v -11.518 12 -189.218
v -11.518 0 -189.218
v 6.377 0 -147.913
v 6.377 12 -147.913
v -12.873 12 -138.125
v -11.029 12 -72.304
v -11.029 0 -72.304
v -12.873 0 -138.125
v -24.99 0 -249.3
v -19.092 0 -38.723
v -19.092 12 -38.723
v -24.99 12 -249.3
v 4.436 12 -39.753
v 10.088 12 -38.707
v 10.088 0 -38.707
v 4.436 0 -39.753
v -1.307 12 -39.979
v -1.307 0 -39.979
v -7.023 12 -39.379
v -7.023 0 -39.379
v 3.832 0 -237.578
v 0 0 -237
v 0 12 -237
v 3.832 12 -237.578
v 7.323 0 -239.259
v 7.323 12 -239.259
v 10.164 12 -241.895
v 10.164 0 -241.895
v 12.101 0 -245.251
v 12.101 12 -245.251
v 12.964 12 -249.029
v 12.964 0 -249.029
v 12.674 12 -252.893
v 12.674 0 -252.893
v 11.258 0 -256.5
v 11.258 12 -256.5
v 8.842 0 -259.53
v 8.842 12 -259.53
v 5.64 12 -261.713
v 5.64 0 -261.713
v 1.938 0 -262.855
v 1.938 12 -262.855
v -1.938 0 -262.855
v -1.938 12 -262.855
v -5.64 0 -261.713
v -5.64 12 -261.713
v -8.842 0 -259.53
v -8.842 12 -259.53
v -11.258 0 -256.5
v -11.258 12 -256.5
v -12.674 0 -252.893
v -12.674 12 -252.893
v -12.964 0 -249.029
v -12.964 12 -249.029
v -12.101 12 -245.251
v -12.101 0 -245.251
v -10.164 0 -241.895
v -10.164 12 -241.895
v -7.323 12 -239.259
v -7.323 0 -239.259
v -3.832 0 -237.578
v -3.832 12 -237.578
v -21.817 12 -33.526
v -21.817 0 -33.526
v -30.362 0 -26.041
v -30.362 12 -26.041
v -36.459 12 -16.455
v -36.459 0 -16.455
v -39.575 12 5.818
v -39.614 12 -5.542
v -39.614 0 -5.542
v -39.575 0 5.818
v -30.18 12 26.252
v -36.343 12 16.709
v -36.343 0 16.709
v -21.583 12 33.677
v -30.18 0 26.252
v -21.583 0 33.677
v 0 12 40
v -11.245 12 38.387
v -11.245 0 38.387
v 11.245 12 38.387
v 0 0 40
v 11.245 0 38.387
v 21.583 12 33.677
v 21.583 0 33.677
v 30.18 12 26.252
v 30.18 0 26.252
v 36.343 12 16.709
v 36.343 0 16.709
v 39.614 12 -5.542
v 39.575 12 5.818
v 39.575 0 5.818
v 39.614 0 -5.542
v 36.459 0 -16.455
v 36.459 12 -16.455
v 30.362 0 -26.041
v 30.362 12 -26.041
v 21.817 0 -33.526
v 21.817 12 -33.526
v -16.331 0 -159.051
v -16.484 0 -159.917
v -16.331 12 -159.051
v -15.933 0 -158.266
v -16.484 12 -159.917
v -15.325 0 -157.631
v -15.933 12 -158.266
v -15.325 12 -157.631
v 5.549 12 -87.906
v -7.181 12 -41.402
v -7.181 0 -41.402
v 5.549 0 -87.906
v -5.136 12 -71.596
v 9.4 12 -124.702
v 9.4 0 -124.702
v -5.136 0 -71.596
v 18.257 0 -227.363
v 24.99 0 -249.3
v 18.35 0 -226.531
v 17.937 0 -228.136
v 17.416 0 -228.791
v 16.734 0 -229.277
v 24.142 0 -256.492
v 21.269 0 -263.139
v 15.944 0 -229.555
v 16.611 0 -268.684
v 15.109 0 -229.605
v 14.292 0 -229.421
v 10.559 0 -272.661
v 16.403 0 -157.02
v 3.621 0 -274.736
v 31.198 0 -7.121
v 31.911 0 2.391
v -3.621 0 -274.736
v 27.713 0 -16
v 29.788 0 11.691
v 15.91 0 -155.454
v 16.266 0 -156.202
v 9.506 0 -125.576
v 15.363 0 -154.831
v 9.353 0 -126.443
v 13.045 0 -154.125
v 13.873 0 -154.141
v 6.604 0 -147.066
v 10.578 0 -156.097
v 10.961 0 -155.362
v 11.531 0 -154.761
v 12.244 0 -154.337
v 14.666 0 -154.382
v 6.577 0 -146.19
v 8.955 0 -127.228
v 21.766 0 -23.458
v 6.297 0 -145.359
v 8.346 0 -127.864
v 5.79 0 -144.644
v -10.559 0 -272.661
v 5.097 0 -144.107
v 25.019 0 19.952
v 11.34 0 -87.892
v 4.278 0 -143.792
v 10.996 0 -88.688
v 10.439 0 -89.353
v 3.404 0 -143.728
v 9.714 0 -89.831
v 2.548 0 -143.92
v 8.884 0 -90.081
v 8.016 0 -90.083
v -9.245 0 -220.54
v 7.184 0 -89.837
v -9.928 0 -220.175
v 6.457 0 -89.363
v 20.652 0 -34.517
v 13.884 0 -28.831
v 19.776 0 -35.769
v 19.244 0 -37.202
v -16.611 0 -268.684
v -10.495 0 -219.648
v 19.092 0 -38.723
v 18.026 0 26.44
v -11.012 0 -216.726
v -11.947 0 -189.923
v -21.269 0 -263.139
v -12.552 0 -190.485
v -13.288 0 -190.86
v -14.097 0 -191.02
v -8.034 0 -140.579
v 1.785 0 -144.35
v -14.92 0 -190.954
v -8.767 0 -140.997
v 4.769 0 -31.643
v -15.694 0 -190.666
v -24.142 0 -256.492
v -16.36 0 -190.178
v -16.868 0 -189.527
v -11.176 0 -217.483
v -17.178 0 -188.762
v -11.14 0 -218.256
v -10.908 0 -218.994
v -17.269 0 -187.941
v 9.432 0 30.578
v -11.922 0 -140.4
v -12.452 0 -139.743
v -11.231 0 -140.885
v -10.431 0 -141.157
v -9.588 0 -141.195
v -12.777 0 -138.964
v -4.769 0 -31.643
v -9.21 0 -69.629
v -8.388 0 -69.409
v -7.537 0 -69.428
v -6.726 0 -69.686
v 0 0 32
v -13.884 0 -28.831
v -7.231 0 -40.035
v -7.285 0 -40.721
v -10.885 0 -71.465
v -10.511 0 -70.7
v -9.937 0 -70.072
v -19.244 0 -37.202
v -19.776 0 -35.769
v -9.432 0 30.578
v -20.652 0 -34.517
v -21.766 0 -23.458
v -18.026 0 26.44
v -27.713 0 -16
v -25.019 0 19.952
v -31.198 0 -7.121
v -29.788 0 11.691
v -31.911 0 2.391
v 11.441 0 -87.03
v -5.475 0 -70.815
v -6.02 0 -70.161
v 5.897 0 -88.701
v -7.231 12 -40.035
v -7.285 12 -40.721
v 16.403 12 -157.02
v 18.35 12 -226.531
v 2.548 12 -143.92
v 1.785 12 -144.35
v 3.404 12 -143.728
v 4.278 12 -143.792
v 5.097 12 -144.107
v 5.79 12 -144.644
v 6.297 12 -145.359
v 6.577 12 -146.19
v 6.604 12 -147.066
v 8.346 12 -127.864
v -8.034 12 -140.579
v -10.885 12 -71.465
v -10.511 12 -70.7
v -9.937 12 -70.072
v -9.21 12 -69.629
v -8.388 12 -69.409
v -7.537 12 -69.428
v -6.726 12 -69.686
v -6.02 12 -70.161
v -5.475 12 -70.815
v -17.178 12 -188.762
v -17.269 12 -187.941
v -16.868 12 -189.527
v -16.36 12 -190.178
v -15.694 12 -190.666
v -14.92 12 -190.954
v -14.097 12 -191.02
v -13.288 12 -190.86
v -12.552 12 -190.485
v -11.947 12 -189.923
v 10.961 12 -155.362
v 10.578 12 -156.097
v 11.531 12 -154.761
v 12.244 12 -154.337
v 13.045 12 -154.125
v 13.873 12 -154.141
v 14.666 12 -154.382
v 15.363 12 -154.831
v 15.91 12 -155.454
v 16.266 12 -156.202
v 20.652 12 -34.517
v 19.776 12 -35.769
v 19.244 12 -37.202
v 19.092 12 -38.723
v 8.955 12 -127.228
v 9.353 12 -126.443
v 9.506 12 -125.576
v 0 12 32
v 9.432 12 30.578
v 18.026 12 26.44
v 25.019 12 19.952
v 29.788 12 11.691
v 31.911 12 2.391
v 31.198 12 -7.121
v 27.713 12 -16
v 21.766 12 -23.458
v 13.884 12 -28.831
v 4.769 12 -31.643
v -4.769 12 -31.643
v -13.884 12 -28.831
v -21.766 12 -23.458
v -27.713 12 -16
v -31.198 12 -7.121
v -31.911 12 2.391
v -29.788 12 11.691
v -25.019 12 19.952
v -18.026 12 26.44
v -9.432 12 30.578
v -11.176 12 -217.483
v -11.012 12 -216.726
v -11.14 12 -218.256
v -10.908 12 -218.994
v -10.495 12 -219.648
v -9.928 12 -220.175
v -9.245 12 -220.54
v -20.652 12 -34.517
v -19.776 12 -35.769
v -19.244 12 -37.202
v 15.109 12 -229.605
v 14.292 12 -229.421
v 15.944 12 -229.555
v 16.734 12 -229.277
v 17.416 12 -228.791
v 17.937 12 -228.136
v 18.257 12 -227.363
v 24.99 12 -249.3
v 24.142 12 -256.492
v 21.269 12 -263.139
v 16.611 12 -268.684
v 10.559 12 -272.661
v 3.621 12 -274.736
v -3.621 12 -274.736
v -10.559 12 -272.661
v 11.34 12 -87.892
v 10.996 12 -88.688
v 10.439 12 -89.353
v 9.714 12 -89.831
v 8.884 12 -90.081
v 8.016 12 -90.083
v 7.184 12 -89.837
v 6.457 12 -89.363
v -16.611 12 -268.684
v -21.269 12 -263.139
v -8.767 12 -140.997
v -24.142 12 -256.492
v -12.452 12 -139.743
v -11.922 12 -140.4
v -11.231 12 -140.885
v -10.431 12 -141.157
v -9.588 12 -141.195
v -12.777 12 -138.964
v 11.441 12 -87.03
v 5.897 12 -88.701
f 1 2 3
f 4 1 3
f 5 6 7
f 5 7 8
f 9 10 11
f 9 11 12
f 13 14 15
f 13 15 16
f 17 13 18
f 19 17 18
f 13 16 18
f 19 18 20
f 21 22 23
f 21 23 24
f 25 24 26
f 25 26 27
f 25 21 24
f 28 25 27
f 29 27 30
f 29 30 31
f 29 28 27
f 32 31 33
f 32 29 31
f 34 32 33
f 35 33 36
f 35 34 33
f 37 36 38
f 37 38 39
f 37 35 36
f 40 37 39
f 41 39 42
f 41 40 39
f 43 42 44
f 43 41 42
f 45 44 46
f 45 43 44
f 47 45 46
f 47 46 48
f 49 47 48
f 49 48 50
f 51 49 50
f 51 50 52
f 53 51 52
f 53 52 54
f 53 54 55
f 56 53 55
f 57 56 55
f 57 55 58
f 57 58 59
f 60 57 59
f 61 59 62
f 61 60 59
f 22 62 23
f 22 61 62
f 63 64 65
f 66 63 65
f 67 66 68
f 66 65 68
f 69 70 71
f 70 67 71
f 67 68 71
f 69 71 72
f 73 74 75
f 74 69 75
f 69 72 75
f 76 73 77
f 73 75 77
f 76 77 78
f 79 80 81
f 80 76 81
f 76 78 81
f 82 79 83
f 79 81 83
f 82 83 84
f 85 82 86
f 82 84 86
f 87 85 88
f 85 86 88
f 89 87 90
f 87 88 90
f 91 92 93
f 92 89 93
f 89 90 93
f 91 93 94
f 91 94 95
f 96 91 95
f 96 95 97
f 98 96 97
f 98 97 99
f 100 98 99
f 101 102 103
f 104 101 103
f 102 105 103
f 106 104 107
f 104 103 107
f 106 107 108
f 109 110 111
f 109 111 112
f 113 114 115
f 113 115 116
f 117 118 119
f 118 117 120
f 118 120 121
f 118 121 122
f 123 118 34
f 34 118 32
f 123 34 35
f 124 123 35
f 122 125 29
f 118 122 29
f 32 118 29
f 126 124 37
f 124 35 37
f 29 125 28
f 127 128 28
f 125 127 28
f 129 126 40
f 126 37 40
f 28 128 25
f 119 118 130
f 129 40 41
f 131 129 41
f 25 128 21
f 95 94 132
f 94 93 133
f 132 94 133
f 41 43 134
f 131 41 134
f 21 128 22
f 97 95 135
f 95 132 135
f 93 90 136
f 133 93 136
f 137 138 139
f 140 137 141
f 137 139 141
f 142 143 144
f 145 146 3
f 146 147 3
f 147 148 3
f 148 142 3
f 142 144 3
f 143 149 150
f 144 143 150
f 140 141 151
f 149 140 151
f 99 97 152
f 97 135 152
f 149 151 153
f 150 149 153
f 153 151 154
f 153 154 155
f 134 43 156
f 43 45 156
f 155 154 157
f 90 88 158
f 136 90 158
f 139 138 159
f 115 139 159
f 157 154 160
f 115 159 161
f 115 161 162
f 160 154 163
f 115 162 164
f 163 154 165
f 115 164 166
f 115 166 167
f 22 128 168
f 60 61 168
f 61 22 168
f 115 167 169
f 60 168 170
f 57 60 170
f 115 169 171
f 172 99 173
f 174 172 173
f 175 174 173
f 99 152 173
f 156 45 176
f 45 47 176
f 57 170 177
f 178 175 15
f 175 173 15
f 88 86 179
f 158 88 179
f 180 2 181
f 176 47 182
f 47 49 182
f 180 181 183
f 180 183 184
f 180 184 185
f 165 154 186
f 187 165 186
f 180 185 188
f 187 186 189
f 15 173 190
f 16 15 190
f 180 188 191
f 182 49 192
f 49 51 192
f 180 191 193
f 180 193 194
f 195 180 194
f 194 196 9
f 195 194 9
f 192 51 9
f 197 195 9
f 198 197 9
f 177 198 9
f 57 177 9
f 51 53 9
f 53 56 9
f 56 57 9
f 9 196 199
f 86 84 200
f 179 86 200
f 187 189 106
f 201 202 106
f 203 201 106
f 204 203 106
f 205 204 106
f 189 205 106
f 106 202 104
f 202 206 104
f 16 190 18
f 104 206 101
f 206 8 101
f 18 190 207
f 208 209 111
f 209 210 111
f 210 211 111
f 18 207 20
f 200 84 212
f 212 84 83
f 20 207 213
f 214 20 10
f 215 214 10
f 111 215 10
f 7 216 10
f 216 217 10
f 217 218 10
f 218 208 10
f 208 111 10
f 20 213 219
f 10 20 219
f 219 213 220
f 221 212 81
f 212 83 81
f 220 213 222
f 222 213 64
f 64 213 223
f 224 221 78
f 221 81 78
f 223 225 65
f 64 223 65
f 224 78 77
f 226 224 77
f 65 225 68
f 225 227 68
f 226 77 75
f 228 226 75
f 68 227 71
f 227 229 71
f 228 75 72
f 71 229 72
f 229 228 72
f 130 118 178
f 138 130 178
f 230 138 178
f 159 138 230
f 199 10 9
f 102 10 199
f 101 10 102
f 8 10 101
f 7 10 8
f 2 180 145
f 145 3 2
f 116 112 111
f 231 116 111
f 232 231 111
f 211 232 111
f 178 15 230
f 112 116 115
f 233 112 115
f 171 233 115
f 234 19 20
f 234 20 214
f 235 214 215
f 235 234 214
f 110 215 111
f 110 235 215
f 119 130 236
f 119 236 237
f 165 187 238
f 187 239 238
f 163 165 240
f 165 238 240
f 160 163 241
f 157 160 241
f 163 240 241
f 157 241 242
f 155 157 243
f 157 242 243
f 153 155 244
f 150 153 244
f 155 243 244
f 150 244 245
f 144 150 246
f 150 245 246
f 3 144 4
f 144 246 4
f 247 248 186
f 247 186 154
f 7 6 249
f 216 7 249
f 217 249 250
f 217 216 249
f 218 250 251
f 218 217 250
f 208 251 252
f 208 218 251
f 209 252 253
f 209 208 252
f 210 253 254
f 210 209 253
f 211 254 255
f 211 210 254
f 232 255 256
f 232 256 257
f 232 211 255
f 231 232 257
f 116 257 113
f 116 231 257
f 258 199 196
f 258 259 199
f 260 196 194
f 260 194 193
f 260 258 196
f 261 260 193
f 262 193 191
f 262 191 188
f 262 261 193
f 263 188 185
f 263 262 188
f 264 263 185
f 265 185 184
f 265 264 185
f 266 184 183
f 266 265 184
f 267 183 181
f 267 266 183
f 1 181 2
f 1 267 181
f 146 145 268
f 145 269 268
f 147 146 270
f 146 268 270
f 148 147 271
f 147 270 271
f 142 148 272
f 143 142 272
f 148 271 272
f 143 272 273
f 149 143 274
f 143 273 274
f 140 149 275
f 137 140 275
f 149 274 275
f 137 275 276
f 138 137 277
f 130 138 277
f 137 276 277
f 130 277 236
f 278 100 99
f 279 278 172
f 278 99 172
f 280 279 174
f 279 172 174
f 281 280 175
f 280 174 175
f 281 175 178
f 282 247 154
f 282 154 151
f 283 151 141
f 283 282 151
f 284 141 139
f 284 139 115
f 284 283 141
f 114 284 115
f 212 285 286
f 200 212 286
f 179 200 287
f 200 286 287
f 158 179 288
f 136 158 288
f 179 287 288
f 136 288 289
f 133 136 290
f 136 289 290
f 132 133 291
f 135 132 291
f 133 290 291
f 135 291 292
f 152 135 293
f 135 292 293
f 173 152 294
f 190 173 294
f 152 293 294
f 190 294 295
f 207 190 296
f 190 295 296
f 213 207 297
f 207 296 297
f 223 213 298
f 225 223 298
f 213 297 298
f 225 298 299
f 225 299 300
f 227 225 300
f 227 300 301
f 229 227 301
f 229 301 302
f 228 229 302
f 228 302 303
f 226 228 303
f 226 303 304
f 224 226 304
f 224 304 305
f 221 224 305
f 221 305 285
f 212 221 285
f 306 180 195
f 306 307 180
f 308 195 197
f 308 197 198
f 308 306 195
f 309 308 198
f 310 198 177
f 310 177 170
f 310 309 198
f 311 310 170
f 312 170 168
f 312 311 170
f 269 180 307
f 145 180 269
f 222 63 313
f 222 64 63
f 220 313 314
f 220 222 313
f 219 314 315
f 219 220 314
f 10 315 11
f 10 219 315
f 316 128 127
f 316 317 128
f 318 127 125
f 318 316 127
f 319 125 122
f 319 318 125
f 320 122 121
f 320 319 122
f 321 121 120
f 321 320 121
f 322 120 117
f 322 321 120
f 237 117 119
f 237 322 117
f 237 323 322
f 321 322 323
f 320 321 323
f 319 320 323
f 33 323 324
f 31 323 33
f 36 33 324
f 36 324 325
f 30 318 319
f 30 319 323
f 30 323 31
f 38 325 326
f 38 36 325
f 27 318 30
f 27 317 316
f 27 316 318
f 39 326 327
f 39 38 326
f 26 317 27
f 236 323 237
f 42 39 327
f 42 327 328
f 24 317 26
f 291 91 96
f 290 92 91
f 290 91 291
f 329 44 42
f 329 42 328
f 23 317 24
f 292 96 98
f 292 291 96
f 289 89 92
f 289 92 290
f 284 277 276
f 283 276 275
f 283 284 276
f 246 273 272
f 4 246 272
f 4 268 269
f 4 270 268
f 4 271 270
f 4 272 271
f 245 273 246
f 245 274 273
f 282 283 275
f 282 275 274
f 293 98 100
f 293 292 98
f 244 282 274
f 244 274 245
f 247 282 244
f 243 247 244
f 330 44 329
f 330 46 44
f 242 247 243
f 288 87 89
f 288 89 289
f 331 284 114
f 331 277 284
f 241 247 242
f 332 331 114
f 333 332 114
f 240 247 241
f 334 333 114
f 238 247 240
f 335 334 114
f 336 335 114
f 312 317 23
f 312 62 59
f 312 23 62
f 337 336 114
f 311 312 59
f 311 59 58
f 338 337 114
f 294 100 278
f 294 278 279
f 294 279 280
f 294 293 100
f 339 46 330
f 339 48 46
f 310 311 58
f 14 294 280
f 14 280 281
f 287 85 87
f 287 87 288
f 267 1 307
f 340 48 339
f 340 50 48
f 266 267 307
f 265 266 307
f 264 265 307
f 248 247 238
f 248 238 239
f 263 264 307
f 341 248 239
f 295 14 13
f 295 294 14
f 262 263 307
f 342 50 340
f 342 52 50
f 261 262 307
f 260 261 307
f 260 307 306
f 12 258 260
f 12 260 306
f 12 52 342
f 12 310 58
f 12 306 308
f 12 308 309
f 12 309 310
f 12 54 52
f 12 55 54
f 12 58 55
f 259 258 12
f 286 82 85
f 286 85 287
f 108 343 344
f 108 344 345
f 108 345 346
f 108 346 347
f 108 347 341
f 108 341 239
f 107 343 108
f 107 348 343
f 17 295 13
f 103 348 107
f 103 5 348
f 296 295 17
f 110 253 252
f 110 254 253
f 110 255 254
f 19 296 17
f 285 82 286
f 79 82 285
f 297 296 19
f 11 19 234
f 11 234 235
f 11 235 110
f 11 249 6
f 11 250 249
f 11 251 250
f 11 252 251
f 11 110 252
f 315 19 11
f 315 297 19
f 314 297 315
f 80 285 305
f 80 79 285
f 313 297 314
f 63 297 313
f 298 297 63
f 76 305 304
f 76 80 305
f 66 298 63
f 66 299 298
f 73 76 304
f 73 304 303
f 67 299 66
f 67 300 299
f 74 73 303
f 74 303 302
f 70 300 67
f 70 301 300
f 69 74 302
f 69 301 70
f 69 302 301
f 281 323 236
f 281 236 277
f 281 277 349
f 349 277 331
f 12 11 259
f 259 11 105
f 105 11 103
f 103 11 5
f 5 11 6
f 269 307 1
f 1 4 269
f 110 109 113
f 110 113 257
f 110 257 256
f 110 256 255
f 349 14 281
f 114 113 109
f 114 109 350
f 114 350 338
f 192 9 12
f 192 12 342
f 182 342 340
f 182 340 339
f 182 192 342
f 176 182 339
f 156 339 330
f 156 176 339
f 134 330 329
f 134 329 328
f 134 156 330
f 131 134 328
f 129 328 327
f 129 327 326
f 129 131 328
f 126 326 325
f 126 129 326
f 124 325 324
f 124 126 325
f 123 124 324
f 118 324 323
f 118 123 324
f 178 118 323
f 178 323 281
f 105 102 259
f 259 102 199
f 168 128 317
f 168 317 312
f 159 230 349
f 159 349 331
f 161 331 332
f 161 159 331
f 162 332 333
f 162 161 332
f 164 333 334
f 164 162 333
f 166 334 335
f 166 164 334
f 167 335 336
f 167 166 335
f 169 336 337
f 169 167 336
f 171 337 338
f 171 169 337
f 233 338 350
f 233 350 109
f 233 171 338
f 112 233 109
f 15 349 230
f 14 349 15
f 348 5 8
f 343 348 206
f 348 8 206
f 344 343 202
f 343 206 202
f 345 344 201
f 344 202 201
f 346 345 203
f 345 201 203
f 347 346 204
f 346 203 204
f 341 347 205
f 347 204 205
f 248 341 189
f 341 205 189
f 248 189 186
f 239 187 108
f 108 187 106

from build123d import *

# Parameters (mm, degrees)
SKETCH_1_R          = 5.05
SKETCH_1_R_2        = 13
EXTRUDE_1_DEPTH     = 12
FILLET_1_R          = 3
CUT_EXTRUDE_3_DEPTH = 277.39464539
FILLET_2_R          = 3
EXTRUDE_START       = -12
SKETCH_5_R          = 40
SKETCH_5_R_2        = 5.05
EXTRUDE_2_DEPTH     = 12
FILLET_3_R          = 6
EXTRUDE_3_DEPTH     = 12
FILLET_4_R          = 3
SKETCH_8_R          = 32
CUT_EXTRUDE_5_DEPTH = 279.152835686


with BuildPart() as part:
    # 草图1 → 凸台-拉伸1 (new body)
    with BuildSketch(Plane(origin=(0, 0, 0), x_dir=(1, 0, 0), z_dir=(0, 1, 0))):
        with BuildLine():
            Line((-17.992942616, -0.504), (-24.990198078, 249.3))
            ThreePointArc((-24.990198078, 249.3), (0, 275), (24.990198078, 249.3))
            Line((24.990198078, 249.3), (17.992942616, -0.504))
            ThreePointArc((17.992942616, -0.504), (0, -18), (-17.992942616, -0.504))
        make_face()
        with Locations(Location((0, 0, 0), (0, 0, 270))):
            Circle(SKETCH_1_R, mode=Mode.SUBTRACT)
        with Locations(Location((0, 250, 0), (0, 0, 270))):
            Circle(SKETCH_1_R_2, mode=Mode.SUBTRACT)
        Polygon((-16.444447487, 158.5), (-17.704941698, 203.5), (11.028871219, 137.174942267), align=None, mode=Mode.SUBTRACT)
        Polygon((15.954255294, 141), (18.475243716, 231), (-12, 219.5), align=None, mode=Mode.SUBTRACT)
    extrude(amount=EXTRUDE_1_DEPTH)

    # 圆角1
    fillet_1_edges = [part.edges().sort_by_distance(p)[0] for p in [
        (-16.444447487, 6, -158.5),
        (11.028871219, 6, -137.174942267),
        (-17.704941698, 6, -203.5),
        (18.475243716, 6, -231),
        (-12, 6, -219.5),
        (15.954255294, 6, -141),
    ]]
    fillet(fillet_1_edges, radius=FILLET_1_R)

    # 草图4 → 切除-拉伸3 (cut, through all)
    with BuildSketch(Plane(origin=(0, 12, 0), x_dir=(1, 0, 0), z_dir=(0, 1, 0))):
        Polygon((-13.050343026, 144.472367448), (12.494927596, 124.643879429), (9.742058902, 26.365688077), (-10.175105816, 41.825585442), align=None)
    extrude(amount=-CUT_EXTRUDE_3_DEPTH, mode=Mode.SUBTRACT)

    # 圆角2
    fillet_2_edges = [part.edges().sort_by_distance(p)[0] for p in [
        (-10.175105816, 6, -41.825585442),
        (-13.050343026, 6, -144.472367448),
        (9.742058902, 6, -26.365688077),
    ]]
    fillet(fillet_2_edges, radius=FILLET_2_R)

    # 草图5 → 凸台-拉伸2 (add)
    with BuildSketch(Plane(origin=(0, 12, 0), x_dir=(1, 0, 0), z_dir=(0, 1, 0)).offset(EXTRUDE_START)):
        Circle(SKETCH_5_R)
        with Locations(Location((0, 0, 0), (0, 0, 270))):
            Circle(SKETCH_5_R_2, mode=Mode.SUBTRACT)
    extrude(amount=EXTRUDE_2_DEPTH)

    # 圆角3
    fillet_3_edges = [part.edges().sort_by_distance(p)[0] for p in [
        (18.993134598, 6, -35.203136766),
        (-18.993134598, 6, -35.203136766),
    ]]
    fillet(fillet_3_edges, radius=FILLET_3_R)

    # 草图6 → 凸台-拉伸3 (add)
    with BuildSketch(Plane(origin=(0, 12, 0), x_dir=(1, 0, 0), z_dir=(0, 1, 0))):
        Polygon((9.60137553, 125.435937788), (-13.068657882, 42.617643801), (-7.609801347, 39.834371112), (-7.28155375, 41.033527083), (15.388479662, 123.85182107), (9.929623127, 126.635093759), align=None)
    extrude(amount=-EXTRUDE_3_DEPTH)

    # 圆角4
    # the kernel refuses this fillet: 3 mm, written as the material it adds along each edge
    with BuildSketch(Plane(origin=(12.14036175, 0, -111.985778385), x_dir=(-0.028000000000000382, 0, 0.9996079231378672), z_dir=(0, 1, 0))) as fillet_4_piece_1:
        with BuildLine():
            CenterArc((FILLET_4_R * 8.32187878655, -FILLET_4_R), FILLET_4_R, 90, 166.295794849)
            Line((FILLET_4_R * 8.08496933551, -FILLET_4_R * 1.97153173495), (FILLET_4_R * 8.08023114649, -FILLET_4_R * 1.99096236965))
            Line((FILLET_4_R * 8.08023114649, -FILLET_4_R * 1.99096236965), (-FILLET_4_R * 0.0047381890208, -FILLET_4_R * 0.0194306346989))
            Line((-FILLET_4_R * 0.0047381890208, -FILLET_4_R * 0.0194306346989), (0, FILLET_4_R * 0.02))
            Line((0, FILLET_4_R * 0.02), (FILLET_4_R * 8.32187878655, FILLET_4_R * 0.02))
            Line((FILLET_4_R * 8.32187878655, FILLET_4_R * 0.02), (FILLET_4_R * 8.32187878655, 0))
        make_face()
    extrude(amount=12)
    with BuildSketch(Plane(origin=(-10.463842583, 0, -52.133569747), x_dir=(-0.02799999999999904, 0, -0.9996079231378672), z_dir=(0, 1, 0))) as fillet_4_piece_2:
        with BuildLine():
            CenterArc((FILLET_4_R * 6.72600834912, -FILLET_4_R), FILLET_4_R, 90, 163.086811796)
            Line((FILLET_4_R * 6.43508592619, -FILLET_4_R * 1.95674664558), (FILLET_4_R * 6.42926747773, -FILLET_4_R * 1.9758815785))
            Line((FILLET_4_R * 6.42926747773, -FILLET_4_R * 1.9758815785), (-FILLET_4_R * 0.00581844845863, -FILLET_4_R * 0.0191349329117))
            Line((-FILLET_4_R * 0.00581844845863, -FILLET_4_R * 0.0191349329117), (0, FILLET_4_R * 0.02))
            Line((0, FILLET_4_R * 0.02), (FILLET_4_R * 6.72600834912, FILLET_4_R * 0.02))
            Line((FILLET_4_R * 6.72600834912, FILLET_4_R * 0.02), (FILLET_4_R * 6.72600834912, 0))
        make_face()
    extrude(amount=12)
    with BuildSketch(Plane(origin=(9.929623127, 12, -126.635093759), x_dir=(-0.7899521186549702, 0, -0.6131685333026506), z_dir=(0, -1, 0))) as fillet_4_piece_3:
        with BuildLine():
            CenterArc((FILLET_4_R * 0.668049057951, -FILLET_4_R), FILLET_4_R, 90, 67.489733811)
            Line((-FILLET_4_R * 0.255761890972, -FILLET_4_R * 0.617151034153), (-FILLET_4_R * 0.27423810995, -FILLET_4_R * 0.609494054836))
            Line((-FILLET_4_R * 0.27423810995, -FILLET_4_R * 0.609494054836), (-FILLET_4_R * 0.013360981159, FILLET_4_R * 0.02))
            Line((-FILLET_4_R * 0.013360981159, FILLET_4_R * 0.02), (FILLET_4_R * 0.668049057951, FILLET_4_R * 0.02))
            Line((FILLET_4_R * 0.668049057951, FILLET_4_R * 0.02), (FILLET_4_R * 0.668049057951, 0))
        make_face()
    extrude(amount=12)
    with BuildSketch(Plane(origin=(-7.609801347, 12, -39.834371112), x_dir=(0.789952118654971, 0, 0.6131685333026496), z_dir=(0, -1, 0))) as fillet_4_piece_4:
        with BuildLine():
            CenterArc((2.149138752, -2.650136686), FILLET_4_R, 117.947316923, 39.542416888)
            Line((-0.622294094, -1.501589789), (-0.677722751, -1.478618851))
            Line((-0.677722751, -1.478618851), (-0.055428657, 0.022970938))
            Line((-0.055428657, 0.022970938), (0, 0.06))
            ThreePointArc((0, 0.06), (0.371580126, 0.06), (0.715040682, 0.053002734))
            Line((0.715040682, 0.053002734), (0.743160252, 0))
        make_face()
    extrude(amount=12)

    # 草图8 → 切除-拉伸5 (cut, through all)
    with BuildSketch(Plane(origin=(0, 12, 0), x_dir=(1, 0, 0), z_dir=(0, 1, 0))):
        with Locations(Location((0, 0, 0), (0, 0, 270))):
            Circle(SKETCH_8_R)
    extrude(amount=-CUT_EXTRUDE_5_DEPTH, mode=Mode.SUBTRACT)


solid = part.part
